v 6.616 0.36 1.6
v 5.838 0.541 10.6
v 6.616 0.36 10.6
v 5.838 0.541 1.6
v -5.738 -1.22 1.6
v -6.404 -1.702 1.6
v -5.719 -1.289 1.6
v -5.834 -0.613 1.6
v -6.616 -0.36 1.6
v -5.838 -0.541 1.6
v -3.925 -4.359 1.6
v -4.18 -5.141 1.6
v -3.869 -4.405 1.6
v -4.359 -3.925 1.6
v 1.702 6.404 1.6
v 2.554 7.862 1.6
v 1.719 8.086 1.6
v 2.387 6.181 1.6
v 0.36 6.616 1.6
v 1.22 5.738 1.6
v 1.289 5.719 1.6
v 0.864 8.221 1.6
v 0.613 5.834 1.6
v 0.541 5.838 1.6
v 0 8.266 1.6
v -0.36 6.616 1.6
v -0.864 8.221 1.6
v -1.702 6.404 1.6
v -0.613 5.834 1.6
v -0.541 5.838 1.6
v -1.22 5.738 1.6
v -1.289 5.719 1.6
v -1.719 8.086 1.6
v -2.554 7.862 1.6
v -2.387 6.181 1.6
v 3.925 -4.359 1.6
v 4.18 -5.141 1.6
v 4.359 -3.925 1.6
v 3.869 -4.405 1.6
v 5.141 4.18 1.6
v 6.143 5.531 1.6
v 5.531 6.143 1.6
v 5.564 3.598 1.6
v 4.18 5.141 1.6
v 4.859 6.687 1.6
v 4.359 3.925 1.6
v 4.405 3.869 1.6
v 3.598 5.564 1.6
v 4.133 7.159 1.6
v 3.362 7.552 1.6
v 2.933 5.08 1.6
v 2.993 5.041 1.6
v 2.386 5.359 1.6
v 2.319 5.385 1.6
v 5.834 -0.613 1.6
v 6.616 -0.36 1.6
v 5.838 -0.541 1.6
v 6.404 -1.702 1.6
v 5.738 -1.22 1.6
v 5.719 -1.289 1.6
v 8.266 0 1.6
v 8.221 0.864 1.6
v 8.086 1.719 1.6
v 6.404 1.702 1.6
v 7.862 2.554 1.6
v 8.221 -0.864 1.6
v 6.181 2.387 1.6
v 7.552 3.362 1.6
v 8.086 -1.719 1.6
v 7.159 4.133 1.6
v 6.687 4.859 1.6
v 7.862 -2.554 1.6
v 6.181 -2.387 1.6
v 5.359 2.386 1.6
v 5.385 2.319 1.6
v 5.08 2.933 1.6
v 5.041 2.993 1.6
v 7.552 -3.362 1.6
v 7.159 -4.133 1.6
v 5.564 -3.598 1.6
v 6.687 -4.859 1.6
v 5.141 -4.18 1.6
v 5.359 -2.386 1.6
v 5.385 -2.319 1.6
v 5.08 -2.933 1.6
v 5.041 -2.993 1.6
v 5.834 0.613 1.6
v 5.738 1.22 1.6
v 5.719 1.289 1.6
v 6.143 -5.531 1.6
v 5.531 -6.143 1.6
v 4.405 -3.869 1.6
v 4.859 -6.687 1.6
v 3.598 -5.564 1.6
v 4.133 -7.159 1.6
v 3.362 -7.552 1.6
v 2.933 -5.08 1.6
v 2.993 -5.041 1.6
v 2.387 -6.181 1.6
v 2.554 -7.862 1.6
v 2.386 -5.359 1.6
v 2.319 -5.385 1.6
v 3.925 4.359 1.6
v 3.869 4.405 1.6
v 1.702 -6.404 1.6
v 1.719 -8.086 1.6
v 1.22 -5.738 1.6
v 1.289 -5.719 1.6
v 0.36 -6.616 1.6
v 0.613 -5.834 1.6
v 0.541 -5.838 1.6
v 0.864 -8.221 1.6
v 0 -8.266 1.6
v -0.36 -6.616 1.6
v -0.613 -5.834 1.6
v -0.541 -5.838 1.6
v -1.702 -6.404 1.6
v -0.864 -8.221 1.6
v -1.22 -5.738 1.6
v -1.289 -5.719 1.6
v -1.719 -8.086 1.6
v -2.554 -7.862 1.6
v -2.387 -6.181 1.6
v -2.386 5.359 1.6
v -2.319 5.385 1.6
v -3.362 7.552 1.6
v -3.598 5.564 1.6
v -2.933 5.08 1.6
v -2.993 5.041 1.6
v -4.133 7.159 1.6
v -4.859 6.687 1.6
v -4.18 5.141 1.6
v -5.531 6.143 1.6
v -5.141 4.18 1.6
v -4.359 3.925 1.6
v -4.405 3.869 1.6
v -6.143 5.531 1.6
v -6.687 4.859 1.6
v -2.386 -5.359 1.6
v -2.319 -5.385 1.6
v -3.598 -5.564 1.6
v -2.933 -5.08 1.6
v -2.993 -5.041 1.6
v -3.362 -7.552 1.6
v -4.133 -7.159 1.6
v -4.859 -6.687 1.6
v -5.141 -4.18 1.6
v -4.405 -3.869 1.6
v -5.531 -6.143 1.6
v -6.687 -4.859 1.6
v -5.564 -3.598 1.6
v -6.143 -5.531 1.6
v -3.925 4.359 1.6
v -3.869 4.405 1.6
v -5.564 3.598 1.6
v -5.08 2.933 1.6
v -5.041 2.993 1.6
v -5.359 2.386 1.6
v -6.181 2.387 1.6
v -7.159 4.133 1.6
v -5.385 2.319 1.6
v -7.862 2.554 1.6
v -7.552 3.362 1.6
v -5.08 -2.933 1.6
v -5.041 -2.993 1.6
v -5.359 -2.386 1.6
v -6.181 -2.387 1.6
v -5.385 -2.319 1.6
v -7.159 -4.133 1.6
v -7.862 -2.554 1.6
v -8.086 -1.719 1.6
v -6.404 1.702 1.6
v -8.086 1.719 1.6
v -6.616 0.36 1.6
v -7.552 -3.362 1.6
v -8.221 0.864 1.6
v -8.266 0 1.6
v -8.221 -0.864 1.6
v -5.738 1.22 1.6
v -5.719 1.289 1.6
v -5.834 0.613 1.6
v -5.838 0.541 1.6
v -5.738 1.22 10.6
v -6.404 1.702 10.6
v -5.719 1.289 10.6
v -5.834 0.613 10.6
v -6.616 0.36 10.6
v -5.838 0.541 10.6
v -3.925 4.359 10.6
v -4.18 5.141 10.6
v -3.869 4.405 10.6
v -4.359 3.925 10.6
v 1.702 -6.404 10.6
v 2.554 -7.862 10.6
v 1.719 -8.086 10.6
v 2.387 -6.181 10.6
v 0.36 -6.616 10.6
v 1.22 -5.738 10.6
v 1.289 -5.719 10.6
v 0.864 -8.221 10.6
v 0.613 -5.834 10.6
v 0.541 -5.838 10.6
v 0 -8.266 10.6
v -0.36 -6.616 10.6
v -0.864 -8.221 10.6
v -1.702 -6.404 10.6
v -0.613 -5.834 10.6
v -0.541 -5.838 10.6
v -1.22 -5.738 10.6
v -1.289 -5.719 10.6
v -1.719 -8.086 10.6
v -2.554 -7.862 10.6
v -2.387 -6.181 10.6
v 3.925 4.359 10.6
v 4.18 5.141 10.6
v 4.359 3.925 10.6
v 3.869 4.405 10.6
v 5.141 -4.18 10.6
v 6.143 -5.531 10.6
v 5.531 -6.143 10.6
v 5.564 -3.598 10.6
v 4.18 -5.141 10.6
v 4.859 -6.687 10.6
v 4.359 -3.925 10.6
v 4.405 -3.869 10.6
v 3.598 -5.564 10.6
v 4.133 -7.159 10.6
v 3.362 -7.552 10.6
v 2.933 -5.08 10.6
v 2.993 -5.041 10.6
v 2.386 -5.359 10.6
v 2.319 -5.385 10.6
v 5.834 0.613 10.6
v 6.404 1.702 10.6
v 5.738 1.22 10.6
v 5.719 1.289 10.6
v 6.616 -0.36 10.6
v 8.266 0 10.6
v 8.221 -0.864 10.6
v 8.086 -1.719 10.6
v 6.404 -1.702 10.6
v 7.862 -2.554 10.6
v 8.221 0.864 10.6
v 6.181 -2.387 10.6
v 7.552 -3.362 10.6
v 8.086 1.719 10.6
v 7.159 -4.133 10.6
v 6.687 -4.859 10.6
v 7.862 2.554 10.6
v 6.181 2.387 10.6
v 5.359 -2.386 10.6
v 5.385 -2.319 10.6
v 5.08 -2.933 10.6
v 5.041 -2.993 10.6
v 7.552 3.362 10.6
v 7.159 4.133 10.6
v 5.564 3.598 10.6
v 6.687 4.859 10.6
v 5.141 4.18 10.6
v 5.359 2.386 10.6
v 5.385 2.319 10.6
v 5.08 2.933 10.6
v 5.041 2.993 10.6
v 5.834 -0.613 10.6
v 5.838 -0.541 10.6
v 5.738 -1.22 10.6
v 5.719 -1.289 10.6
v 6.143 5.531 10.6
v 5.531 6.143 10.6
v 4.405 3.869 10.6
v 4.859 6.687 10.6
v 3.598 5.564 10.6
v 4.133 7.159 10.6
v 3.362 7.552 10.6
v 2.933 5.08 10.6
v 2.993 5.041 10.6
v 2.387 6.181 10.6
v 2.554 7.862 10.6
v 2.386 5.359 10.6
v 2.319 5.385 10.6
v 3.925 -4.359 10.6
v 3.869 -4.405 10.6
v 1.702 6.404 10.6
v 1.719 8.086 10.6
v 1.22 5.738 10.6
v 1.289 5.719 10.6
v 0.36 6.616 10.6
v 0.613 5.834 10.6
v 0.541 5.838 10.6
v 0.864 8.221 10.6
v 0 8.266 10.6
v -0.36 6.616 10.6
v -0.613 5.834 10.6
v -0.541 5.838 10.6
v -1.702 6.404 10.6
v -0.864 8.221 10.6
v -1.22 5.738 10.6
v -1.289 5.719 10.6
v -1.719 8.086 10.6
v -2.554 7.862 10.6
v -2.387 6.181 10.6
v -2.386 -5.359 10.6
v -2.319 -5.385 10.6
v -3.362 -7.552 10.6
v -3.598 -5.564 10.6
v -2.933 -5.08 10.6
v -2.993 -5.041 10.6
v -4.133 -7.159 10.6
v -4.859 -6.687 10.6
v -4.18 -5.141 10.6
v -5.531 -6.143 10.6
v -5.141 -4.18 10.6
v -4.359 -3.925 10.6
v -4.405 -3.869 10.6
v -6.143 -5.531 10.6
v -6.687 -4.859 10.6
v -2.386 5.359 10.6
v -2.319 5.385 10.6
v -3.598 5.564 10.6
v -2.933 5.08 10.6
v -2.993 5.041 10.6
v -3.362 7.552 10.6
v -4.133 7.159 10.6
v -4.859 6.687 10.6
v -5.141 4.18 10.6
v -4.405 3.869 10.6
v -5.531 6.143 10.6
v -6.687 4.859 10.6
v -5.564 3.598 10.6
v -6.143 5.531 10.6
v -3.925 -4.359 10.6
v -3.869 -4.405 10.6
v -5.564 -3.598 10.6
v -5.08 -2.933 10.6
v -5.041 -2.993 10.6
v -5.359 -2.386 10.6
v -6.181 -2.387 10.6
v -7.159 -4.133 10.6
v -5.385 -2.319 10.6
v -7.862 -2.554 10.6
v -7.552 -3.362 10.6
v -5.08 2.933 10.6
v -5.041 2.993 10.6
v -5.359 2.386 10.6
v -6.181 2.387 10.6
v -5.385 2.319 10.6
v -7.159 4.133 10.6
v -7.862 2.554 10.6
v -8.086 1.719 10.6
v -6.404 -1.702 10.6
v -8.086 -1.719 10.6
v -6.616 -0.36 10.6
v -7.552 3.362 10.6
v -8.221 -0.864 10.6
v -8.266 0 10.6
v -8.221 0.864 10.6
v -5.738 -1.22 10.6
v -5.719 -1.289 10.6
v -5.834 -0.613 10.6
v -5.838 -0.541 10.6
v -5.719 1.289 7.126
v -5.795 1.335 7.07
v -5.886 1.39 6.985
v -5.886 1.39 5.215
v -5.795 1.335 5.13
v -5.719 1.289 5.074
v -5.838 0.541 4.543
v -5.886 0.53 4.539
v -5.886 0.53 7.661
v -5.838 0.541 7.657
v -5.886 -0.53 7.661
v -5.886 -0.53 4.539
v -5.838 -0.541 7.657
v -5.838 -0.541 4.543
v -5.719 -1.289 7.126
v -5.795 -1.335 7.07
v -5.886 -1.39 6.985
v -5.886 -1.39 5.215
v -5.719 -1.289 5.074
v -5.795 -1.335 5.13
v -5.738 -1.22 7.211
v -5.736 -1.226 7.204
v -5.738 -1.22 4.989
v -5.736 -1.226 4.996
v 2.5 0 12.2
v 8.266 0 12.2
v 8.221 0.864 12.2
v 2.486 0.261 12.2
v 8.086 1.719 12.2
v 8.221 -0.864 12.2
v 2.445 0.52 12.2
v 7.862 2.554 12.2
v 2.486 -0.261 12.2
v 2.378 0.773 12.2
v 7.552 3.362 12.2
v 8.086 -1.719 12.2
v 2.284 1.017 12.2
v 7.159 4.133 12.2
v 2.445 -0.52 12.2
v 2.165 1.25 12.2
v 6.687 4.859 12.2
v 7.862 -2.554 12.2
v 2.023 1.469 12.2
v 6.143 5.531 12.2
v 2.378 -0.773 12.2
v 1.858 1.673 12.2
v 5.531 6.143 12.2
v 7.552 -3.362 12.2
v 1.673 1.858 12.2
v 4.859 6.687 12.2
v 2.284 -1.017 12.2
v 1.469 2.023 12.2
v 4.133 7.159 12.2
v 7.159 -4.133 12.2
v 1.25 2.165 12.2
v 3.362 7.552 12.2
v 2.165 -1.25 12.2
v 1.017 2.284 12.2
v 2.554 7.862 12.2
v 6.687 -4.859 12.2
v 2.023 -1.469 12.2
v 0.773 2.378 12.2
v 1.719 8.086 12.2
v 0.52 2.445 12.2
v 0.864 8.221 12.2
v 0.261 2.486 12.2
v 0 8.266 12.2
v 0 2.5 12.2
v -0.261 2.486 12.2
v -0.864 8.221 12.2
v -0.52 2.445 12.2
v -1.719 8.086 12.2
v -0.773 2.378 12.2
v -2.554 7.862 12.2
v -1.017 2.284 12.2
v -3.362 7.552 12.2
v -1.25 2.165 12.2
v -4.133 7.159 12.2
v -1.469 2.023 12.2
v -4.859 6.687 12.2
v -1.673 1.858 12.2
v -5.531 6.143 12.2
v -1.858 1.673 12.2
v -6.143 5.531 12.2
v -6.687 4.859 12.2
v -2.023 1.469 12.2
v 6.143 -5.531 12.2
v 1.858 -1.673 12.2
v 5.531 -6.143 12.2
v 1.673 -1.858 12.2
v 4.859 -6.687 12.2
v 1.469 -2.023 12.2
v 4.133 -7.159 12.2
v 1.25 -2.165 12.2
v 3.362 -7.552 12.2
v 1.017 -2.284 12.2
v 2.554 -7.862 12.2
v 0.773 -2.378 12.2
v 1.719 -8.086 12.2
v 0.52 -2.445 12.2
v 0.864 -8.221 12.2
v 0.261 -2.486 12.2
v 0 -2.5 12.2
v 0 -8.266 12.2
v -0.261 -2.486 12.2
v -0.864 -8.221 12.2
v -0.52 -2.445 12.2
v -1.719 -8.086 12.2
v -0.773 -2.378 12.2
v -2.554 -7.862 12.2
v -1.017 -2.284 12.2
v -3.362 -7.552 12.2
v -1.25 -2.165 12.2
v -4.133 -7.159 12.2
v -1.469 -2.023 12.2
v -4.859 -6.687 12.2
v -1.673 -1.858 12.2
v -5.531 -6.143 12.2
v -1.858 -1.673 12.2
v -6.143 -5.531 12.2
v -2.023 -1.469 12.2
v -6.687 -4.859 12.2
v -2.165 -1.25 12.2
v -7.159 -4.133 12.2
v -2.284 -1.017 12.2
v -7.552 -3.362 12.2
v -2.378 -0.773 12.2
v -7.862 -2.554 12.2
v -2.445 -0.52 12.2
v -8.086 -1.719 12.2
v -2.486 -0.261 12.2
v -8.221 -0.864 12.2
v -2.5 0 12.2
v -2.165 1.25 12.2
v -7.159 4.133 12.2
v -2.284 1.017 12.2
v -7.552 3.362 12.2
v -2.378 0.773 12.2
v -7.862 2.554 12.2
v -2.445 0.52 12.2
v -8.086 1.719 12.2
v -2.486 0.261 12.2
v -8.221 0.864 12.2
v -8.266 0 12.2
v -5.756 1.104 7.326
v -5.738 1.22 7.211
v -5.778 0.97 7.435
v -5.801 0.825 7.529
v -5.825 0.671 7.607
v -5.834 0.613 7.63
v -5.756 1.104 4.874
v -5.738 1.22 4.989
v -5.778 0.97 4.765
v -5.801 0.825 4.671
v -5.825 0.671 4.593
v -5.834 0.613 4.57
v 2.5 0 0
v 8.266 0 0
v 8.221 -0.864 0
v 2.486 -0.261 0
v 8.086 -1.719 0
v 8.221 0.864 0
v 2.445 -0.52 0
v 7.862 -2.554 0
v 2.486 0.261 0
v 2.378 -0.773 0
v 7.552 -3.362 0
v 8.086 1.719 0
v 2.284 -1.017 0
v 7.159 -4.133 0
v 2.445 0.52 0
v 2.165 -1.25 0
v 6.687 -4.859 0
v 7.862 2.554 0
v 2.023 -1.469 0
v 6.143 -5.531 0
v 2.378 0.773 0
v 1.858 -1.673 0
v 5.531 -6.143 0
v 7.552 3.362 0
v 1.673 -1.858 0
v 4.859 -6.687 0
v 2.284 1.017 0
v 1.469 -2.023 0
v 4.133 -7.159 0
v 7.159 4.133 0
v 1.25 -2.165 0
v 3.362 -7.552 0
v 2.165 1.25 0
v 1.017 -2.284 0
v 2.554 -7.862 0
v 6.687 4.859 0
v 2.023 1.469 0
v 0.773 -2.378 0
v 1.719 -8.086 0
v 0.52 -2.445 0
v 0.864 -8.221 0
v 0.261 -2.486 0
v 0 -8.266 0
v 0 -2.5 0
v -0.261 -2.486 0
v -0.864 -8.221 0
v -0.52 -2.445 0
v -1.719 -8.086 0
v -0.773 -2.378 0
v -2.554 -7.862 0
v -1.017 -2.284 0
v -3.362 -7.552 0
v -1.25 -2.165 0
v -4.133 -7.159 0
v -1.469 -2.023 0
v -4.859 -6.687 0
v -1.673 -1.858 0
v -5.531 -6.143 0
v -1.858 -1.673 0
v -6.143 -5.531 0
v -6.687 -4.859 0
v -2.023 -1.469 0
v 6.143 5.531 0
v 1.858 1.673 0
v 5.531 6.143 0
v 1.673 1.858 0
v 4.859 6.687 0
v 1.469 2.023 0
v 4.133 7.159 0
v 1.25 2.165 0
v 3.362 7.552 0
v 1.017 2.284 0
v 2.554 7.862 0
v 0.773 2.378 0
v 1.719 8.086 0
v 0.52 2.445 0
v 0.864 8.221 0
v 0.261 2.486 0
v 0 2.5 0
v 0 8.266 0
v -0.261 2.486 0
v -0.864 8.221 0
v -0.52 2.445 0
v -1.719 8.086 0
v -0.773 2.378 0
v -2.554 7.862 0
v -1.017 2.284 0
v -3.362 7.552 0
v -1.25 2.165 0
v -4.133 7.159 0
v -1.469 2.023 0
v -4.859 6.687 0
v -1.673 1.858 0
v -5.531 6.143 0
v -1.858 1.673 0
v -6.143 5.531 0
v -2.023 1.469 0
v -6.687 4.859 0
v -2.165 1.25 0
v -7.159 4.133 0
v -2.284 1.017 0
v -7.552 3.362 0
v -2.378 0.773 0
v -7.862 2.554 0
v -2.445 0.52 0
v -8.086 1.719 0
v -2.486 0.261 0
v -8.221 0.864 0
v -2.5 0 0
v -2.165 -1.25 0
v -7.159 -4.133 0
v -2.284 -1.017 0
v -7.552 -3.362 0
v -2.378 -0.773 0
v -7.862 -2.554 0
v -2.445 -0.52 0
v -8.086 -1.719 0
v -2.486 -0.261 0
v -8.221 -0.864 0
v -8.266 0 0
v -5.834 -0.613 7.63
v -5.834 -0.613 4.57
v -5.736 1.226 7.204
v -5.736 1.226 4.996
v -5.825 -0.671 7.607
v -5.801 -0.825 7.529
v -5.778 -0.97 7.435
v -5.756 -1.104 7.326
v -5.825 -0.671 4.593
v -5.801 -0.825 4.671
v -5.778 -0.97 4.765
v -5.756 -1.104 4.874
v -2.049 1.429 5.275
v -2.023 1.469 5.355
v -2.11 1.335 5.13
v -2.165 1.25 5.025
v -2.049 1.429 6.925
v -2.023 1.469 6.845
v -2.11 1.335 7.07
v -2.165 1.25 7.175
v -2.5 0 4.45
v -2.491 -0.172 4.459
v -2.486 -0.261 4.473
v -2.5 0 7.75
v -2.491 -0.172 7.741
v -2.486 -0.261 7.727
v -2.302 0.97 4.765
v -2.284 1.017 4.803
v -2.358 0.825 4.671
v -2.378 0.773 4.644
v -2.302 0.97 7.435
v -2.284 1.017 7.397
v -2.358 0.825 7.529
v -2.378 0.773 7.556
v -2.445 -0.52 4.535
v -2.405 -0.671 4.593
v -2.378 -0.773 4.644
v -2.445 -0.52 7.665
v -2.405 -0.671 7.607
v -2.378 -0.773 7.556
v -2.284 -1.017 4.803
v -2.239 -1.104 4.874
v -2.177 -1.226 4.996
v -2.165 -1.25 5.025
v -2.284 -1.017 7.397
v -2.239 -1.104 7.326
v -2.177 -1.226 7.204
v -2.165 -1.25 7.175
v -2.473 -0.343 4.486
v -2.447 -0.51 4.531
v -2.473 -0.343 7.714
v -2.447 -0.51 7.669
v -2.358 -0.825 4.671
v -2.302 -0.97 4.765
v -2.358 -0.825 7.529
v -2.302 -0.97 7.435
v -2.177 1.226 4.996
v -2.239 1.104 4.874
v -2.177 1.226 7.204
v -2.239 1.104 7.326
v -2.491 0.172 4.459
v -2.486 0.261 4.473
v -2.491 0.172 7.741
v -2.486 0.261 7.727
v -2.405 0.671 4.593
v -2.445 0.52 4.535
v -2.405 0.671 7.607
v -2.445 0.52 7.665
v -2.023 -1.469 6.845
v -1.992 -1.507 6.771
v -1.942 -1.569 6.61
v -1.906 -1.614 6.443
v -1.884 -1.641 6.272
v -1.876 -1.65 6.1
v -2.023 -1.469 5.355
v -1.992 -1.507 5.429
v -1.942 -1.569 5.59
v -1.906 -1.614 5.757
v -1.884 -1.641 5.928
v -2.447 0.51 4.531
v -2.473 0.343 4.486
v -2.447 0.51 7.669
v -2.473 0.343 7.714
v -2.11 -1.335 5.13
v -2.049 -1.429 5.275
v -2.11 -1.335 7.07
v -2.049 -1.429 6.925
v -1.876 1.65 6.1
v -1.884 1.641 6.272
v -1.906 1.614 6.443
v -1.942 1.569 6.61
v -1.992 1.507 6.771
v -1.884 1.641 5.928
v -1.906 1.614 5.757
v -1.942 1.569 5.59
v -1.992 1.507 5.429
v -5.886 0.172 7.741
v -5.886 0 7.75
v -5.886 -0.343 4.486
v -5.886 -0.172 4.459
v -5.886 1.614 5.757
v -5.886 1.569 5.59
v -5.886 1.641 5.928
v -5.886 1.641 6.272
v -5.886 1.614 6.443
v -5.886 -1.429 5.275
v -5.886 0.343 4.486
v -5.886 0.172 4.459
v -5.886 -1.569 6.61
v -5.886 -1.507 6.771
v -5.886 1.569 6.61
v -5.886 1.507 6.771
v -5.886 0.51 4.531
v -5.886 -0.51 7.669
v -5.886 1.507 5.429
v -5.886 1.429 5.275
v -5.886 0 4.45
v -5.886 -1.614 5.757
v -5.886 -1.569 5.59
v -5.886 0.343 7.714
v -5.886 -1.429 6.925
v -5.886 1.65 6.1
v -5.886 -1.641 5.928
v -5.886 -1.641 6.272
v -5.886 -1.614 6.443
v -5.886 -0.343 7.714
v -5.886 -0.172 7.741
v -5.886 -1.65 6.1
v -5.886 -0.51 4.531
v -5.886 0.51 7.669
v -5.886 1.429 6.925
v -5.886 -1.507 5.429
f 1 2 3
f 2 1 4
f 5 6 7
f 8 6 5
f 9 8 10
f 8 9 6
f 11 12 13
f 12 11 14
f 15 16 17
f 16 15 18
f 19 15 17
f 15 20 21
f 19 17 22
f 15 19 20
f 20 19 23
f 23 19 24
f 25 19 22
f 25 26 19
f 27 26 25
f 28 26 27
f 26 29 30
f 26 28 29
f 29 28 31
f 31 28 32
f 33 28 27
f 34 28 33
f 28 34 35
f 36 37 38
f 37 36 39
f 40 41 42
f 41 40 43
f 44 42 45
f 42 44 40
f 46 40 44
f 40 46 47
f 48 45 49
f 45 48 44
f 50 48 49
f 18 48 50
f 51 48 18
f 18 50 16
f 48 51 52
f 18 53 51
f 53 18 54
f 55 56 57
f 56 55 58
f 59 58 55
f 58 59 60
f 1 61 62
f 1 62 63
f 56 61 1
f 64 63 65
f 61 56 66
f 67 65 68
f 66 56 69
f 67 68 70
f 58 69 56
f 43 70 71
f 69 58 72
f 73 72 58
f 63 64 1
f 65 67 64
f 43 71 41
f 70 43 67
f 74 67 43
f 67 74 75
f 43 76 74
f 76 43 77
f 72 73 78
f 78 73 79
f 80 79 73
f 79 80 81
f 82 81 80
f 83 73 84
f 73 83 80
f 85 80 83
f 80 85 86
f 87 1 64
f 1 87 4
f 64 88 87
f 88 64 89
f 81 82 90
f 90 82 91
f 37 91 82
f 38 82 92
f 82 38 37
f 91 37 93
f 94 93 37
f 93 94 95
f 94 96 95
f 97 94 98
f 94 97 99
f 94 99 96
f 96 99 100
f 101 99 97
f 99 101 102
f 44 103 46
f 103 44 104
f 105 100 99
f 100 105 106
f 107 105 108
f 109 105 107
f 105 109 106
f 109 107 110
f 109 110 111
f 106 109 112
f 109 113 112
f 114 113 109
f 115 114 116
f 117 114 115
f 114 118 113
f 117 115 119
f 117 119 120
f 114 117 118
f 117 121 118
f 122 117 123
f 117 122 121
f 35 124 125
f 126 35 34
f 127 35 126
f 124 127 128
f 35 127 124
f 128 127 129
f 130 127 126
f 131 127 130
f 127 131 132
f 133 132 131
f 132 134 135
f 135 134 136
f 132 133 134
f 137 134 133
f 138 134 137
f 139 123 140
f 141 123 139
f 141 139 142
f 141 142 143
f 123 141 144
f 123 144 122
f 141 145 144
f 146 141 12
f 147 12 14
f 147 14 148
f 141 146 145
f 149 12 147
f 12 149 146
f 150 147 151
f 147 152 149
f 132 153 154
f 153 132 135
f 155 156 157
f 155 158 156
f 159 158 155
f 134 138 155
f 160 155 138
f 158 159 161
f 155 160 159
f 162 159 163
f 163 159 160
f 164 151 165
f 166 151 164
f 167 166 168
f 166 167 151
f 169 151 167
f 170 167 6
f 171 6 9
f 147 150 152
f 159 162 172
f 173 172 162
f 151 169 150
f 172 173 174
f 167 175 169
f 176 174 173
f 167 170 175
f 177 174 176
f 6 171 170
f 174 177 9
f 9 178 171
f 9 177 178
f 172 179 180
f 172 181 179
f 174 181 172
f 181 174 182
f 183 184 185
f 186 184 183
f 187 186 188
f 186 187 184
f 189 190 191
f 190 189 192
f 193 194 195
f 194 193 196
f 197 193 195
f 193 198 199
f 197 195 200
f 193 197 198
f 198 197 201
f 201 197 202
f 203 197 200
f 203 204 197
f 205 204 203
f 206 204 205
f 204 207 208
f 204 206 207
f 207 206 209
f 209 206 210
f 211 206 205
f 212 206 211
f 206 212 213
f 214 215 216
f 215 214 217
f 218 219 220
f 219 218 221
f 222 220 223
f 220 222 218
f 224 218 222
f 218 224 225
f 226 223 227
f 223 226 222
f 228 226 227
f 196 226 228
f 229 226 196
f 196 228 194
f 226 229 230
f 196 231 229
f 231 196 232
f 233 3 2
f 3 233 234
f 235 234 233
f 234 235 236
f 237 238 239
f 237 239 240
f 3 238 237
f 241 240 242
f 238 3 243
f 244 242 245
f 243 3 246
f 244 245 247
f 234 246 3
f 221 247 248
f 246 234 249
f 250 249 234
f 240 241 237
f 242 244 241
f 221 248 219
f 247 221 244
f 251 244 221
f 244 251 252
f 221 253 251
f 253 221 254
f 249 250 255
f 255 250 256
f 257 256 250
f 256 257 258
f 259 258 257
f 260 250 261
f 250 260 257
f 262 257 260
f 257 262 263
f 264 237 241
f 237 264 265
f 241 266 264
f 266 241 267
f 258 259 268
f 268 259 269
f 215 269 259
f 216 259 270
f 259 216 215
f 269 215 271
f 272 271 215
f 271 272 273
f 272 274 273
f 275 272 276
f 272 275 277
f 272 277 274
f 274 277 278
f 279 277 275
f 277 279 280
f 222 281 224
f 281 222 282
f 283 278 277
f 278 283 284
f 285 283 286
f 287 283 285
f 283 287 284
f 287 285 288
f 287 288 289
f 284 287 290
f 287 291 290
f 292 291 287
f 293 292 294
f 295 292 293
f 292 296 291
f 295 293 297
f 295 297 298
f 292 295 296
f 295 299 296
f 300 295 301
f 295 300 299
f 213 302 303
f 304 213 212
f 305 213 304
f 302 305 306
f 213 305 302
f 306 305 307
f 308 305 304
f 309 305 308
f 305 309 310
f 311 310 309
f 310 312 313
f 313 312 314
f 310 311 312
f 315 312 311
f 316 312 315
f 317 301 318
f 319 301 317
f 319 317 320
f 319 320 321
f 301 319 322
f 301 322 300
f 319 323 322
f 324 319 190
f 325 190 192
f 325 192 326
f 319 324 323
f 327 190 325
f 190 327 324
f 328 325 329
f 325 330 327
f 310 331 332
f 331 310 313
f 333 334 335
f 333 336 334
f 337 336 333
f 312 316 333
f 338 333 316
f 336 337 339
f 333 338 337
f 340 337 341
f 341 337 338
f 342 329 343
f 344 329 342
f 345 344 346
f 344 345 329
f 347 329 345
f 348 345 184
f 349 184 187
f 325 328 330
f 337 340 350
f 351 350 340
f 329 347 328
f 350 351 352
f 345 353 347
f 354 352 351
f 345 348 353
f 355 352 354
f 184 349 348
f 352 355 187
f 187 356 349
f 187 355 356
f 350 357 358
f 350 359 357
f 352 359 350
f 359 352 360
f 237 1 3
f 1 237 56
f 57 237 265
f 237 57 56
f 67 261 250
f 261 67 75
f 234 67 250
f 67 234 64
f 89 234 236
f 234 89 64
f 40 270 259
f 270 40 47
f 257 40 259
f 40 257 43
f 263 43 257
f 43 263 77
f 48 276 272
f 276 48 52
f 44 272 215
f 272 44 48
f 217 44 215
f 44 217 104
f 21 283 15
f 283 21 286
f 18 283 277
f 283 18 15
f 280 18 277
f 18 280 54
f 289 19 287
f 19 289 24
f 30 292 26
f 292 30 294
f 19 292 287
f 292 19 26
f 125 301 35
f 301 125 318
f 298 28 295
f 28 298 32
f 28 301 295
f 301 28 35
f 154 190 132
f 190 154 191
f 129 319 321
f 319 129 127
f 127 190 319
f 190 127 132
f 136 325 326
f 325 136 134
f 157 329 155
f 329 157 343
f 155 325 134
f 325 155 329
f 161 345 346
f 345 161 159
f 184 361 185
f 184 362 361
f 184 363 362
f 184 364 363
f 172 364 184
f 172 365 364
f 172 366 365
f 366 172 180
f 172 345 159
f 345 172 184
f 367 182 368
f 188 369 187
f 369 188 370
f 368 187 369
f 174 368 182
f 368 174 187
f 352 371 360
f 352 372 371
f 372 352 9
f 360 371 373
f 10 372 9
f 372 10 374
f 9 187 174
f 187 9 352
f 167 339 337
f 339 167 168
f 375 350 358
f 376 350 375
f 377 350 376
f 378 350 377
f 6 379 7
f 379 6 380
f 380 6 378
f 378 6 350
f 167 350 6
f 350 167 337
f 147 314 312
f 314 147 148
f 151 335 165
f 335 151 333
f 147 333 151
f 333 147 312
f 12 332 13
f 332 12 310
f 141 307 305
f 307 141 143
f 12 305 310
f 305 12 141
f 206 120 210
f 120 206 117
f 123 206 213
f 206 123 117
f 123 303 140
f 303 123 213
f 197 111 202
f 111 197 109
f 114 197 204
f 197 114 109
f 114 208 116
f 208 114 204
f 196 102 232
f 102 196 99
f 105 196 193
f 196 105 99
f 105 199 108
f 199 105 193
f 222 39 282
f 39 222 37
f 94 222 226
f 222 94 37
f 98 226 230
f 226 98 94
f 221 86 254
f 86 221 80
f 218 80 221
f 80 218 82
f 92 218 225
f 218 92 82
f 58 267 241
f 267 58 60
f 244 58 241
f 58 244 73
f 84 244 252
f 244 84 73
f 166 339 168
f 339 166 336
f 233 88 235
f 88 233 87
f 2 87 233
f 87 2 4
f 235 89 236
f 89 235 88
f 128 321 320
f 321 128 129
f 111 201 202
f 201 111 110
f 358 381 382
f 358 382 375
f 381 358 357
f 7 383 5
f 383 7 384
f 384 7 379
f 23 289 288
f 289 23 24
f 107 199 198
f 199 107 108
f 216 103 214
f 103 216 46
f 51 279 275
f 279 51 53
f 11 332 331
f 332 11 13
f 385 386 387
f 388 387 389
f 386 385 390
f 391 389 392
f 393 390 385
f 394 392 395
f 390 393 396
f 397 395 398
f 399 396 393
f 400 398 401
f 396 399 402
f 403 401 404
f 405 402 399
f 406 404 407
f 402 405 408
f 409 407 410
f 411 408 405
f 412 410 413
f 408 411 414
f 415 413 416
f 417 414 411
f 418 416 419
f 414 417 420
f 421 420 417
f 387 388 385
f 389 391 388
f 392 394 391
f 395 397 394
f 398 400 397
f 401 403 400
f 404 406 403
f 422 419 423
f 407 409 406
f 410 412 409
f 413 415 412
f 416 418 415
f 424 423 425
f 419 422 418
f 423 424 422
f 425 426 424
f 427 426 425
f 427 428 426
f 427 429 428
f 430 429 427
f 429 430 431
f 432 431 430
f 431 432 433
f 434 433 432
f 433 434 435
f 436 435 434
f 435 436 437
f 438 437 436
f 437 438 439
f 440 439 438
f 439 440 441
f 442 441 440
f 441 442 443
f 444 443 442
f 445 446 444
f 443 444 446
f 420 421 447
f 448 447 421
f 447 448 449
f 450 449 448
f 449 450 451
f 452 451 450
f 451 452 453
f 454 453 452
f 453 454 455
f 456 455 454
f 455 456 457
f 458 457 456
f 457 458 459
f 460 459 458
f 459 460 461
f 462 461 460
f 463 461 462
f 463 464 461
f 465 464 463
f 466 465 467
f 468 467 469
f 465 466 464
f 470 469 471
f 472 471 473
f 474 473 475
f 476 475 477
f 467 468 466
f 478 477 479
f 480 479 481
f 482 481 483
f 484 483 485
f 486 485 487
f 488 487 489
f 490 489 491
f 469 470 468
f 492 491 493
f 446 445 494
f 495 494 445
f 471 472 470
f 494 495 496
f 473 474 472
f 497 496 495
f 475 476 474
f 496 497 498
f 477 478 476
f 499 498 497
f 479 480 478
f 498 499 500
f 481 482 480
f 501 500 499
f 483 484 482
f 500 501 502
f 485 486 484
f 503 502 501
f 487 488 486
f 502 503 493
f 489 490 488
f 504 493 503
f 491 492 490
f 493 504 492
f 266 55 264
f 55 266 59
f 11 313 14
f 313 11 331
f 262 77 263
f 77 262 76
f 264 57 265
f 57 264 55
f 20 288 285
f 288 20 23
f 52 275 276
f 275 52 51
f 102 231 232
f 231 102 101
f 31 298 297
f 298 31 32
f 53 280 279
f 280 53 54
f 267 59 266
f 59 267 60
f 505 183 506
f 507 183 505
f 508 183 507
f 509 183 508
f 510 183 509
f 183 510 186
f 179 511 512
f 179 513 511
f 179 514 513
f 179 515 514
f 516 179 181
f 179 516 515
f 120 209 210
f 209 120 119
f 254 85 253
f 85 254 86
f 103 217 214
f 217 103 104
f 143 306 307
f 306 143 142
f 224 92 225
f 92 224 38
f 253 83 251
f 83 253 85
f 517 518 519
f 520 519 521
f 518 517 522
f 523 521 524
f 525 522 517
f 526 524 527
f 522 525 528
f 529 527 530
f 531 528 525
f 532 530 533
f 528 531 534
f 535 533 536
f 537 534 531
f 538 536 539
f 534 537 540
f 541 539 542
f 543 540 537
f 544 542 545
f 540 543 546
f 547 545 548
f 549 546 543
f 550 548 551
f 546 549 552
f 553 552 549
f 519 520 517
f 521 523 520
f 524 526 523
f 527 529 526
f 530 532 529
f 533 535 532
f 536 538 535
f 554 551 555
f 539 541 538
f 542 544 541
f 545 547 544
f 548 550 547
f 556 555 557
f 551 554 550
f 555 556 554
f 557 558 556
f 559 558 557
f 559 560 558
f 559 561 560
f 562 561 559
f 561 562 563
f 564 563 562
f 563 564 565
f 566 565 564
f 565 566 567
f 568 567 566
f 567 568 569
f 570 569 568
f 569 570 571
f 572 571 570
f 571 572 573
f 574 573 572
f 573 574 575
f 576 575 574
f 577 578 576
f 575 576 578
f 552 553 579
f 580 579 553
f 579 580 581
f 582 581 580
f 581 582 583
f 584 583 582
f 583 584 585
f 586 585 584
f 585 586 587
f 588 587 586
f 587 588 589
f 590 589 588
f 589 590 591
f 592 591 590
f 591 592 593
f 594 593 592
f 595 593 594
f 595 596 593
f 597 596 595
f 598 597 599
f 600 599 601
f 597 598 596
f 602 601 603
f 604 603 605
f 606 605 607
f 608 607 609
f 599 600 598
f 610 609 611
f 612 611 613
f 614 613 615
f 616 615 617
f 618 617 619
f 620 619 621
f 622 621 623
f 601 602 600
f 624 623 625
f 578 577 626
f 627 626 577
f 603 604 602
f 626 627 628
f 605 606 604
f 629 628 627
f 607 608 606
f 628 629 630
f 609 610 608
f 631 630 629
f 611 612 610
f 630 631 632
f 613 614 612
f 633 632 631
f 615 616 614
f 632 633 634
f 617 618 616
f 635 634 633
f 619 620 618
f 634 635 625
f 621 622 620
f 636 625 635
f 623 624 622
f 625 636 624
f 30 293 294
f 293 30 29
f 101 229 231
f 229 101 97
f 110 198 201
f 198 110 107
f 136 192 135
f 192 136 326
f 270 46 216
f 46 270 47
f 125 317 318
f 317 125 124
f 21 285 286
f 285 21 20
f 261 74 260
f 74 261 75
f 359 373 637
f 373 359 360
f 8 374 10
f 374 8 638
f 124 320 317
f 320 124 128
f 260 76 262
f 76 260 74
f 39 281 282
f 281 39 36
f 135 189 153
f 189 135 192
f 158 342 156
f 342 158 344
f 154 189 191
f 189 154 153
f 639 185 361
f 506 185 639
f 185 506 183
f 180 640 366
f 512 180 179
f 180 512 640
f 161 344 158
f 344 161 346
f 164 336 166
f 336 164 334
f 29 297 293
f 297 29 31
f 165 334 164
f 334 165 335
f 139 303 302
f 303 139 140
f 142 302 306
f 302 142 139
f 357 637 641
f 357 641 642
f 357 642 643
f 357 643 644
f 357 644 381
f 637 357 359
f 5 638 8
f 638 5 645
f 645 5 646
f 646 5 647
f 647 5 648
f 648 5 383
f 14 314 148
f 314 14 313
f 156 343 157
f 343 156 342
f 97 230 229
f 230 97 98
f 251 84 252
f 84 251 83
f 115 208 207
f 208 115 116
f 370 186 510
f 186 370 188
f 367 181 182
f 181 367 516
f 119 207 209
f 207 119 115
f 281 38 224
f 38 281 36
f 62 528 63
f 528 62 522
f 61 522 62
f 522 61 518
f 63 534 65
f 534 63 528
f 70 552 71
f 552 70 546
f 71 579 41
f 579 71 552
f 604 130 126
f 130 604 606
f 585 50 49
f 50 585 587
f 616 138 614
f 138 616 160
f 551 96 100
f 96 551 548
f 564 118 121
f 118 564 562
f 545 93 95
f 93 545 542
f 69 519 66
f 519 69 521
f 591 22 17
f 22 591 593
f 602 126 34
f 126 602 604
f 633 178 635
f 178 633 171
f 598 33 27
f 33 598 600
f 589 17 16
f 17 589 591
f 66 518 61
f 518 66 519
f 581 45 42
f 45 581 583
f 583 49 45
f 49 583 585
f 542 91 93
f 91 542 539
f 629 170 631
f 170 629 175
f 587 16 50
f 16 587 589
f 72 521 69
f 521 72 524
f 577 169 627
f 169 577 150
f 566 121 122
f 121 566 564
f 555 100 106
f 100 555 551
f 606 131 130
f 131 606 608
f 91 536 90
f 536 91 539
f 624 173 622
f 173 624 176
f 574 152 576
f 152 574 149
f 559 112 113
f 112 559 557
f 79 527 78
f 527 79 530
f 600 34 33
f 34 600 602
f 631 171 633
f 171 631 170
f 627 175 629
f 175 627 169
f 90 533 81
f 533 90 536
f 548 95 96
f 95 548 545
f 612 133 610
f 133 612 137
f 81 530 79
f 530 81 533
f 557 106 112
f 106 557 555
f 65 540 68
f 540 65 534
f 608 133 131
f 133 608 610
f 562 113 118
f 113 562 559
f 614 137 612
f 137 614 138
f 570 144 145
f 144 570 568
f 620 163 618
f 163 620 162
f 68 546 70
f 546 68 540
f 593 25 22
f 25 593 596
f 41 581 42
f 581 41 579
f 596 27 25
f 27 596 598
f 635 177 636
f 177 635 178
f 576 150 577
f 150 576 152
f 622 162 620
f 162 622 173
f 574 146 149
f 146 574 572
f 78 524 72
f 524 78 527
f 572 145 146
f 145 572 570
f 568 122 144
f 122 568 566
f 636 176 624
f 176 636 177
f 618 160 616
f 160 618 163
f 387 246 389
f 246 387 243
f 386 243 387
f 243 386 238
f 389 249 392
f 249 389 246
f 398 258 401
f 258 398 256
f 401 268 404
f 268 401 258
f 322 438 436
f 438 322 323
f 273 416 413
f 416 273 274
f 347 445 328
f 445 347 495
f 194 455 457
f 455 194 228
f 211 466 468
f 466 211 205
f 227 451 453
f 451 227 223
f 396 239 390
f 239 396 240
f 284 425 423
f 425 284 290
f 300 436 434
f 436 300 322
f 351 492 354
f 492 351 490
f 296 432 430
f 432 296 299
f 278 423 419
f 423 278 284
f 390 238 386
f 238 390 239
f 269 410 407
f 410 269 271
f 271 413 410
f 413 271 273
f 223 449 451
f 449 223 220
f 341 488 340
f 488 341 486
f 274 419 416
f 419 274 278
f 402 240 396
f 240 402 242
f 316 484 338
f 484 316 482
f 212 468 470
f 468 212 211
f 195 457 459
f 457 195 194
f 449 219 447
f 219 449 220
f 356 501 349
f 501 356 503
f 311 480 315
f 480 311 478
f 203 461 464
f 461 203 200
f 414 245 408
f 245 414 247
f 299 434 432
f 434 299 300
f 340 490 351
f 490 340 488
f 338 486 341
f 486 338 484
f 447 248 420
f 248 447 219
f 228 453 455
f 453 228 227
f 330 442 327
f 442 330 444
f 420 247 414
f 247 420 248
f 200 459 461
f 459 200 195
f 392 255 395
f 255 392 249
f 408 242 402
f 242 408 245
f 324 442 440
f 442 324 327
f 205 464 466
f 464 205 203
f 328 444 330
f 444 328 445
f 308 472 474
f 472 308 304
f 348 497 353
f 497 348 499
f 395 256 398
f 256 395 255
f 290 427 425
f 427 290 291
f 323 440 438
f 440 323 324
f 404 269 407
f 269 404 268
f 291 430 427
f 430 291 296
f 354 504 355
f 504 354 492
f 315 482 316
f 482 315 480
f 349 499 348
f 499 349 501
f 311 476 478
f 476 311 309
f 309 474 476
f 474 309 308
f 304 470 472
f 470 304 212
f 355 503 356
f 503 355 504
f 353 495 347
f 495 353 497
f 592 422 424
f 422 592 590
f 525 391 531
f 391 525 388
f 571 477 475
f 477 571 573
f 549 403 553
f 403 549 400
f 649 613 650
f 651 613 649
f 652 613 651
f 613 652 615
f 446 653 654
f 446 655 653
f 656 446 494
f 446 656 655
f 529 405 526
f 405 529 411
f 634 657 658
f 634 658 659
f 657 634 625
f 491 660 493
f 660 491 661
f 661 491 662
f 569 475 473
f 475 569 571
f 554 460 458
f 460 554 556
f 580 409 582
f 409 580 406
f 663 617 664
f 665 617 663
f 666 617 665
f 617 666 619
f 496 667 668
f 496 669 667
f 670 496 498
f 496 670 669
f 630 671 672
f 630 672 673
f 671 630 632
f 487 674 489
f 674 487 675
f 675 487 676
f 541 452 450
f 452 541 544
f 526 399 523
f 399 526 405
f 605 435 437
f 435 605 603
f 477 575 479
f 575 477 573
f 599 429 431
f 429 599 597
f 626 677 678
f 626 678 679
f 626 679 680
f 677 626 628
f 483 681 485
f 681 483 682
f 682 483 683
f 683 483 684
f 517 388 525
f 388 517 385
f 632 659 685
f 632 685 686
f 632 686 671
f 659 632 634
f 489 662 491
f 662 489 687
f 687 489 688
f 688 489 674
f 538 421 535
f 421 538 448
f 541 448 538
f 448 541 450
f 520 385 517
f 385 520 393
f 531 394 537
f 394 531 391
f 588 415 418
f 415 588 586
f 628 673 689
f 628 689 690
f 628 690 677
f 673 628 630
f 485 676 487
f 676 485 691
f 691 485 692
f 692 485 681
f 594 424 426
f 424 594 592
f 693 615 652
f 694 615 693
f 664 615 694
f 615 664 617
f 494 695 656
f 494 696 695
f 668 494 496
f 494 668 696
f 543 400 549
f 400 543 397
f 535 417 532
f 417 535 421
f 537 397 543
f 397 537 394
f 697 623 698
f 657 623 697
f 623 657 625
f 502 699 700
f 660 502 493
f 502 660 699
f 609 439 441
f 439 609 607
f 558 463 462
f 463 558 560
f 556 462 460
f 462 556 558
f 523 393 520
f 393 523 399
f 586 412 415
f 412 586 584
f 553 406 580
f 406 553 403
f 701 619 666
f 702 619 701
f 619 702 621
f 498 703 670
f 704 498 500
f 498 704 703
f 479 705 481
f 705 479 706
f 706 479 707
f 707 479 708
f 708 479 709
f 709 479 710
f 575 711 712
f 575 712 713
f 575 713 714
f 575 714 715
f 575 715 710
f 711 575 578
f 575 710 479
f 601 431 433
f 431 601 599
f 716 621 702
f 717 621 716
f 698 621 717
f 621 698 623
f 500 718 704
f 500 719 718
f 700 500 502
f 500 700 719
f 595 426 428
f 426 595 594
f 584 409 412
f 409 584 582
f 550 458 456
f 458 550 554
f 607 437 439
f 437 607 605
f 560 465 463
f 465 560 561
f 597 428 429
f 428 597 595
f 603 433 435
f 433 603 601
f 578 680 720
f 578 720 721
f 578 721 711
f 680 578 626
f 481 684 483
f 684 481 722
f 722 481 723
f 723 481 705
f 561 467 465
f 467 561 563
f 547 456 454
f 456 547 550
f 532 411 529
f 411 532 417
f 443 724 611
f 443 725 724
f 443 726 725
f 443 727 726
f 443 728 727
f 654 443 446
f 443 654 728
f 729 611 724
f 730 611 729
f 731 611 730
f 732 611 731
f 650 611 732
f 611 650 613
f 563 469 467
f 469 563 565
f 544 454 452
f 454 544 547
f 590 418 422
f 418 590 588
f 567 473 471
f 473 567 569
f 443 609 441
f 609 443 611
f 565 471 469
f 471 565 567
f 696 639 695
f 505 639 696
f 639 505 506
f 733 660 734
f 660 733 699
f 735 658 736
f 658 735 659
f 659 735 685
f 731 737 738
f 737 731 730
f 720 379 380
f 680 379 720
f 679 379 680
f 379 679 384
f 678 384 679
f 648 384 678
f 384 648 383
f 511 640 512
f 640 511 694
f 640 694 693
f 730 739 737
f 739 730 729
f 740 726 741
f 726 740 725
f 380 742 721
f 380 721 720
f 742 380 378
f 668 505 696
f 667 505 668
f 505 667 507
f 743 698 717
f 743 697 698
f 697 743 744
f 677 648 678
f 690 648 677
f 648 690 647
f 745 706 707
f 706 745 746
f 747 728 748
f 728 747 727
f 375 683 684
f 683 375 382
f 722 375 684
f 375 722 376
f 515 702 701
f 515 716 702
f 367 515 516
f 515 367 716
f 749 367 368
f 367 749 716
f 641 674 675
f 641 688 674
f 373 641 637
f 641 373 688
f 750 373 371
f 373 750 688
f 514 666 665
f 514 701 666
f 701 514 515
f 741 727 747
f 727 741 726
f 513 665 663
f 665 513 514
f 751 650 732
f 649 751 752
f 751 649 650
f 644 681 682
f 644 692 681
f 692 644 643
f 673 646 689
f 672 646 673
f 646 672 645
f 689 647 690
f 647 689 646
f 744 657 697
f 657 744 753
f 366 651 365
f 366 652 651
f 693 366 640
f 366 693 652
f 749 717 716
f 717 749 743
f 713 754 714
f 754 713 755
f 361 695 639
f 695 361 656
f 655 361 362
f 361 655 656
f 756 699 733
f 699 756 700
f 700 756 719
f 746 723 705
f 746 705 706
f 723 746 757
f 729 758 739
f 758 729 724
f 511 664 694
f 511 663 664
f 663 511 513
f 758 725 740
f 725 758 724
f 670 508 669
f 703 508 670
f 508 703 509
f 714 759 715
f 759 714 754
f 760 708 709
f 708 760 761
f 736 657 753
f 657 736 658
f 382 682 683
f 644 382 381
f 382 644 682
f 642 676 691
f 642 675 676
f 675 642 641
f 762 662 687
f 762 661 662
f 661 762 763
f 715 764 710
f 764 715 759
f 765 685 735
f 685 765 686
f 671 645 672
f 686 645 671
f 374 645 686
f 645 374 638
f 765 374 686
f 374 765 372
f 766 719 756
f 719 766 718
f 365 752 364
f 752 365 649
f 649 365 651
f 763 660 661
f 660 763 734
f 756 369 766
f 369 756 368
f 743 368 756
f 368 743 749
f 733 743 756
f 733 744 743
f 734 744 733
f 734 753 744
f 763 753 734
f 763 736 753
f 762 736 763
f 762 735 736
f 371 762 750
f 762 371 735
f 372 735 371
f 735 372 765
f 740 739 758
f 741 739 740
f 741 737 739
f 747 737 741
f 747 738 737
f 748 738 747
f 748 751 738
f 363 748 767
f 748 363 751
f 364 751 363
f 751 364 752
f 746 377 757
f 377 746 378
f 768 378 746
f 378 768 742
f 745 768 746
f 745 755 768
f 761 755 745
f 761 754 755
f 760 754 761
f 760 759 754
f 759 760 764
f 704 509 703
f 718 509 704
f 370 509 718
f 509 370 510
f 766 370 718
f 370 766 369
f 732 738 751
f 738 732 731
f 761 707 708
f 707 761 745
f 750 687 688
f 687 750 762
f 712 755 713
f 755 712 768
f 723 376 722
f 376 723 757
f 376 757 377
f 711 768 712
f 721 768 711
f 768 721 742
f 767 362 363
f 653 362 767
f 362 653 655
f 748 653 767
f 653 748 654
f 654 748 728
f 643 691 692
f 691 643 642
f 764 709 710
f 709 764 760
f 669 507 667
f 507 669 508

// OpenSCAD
// GT2 pulley 20T / 9 mm belt
// Parametric GT2 pulley. Tooth blocks overlap the core by tooth_overlap to form one solid.
$fn = 60;
eps = 0.02;
min_wall = 1.5;
teeth = 20;
belt_pitch = 2;
belt_width = 9;
shaft_d = 5;
set_screw_d = 3.3;
tooth_depth = 0.75;
tooth_overlap = 0.28;
tooth_base_width = 1.20;
tooth_tip_width = 0.72;
flange_t = 1.6;
flange_overhang = 2.4;
core_d = teeth * belt_pitch / PI - 1.0;
body_h = belt_width + 2 * flange_t;

module gt2_tooth() {
    linear_extrude(height = belt_width)
        polygon(points = [
            [-tooth_overlap, -tooth_base_width / 2],
            [tooth_depth, -tooth_tip_width / 2],
            [tooth_depth, tooth_tip_width / 2],
            [-tooth_overlap, tooth_base_width / 2]
        ]);
}

difference() {
    union() {
        cylinder(d = core_d, h = body_h);
        cylinder(d = core_d + 2 * flange_overhang, h = flange_t);
        translate([0, 0, body_h - flange_t])
            cylinder(d = core_d + 2 * flange_overhang, h = flange_t);
        for (i = [0 : teeth - 1])
            rotate([0, 0, i * 360 / teeth])
                translate([core_d / 2, 0, flange_t]) gt2_tooth();
    }
    translate([0, 0, -eps]) cylinder(d = shaft_d, h = body_h + 2 * eps);
    translate([-core_d / 2 - eps, 0, body_h / 2])
        rotate([0, 90, 0]) cylinder(d = set_screw_d, h = core_d / 2 + 2 * eps);
}
